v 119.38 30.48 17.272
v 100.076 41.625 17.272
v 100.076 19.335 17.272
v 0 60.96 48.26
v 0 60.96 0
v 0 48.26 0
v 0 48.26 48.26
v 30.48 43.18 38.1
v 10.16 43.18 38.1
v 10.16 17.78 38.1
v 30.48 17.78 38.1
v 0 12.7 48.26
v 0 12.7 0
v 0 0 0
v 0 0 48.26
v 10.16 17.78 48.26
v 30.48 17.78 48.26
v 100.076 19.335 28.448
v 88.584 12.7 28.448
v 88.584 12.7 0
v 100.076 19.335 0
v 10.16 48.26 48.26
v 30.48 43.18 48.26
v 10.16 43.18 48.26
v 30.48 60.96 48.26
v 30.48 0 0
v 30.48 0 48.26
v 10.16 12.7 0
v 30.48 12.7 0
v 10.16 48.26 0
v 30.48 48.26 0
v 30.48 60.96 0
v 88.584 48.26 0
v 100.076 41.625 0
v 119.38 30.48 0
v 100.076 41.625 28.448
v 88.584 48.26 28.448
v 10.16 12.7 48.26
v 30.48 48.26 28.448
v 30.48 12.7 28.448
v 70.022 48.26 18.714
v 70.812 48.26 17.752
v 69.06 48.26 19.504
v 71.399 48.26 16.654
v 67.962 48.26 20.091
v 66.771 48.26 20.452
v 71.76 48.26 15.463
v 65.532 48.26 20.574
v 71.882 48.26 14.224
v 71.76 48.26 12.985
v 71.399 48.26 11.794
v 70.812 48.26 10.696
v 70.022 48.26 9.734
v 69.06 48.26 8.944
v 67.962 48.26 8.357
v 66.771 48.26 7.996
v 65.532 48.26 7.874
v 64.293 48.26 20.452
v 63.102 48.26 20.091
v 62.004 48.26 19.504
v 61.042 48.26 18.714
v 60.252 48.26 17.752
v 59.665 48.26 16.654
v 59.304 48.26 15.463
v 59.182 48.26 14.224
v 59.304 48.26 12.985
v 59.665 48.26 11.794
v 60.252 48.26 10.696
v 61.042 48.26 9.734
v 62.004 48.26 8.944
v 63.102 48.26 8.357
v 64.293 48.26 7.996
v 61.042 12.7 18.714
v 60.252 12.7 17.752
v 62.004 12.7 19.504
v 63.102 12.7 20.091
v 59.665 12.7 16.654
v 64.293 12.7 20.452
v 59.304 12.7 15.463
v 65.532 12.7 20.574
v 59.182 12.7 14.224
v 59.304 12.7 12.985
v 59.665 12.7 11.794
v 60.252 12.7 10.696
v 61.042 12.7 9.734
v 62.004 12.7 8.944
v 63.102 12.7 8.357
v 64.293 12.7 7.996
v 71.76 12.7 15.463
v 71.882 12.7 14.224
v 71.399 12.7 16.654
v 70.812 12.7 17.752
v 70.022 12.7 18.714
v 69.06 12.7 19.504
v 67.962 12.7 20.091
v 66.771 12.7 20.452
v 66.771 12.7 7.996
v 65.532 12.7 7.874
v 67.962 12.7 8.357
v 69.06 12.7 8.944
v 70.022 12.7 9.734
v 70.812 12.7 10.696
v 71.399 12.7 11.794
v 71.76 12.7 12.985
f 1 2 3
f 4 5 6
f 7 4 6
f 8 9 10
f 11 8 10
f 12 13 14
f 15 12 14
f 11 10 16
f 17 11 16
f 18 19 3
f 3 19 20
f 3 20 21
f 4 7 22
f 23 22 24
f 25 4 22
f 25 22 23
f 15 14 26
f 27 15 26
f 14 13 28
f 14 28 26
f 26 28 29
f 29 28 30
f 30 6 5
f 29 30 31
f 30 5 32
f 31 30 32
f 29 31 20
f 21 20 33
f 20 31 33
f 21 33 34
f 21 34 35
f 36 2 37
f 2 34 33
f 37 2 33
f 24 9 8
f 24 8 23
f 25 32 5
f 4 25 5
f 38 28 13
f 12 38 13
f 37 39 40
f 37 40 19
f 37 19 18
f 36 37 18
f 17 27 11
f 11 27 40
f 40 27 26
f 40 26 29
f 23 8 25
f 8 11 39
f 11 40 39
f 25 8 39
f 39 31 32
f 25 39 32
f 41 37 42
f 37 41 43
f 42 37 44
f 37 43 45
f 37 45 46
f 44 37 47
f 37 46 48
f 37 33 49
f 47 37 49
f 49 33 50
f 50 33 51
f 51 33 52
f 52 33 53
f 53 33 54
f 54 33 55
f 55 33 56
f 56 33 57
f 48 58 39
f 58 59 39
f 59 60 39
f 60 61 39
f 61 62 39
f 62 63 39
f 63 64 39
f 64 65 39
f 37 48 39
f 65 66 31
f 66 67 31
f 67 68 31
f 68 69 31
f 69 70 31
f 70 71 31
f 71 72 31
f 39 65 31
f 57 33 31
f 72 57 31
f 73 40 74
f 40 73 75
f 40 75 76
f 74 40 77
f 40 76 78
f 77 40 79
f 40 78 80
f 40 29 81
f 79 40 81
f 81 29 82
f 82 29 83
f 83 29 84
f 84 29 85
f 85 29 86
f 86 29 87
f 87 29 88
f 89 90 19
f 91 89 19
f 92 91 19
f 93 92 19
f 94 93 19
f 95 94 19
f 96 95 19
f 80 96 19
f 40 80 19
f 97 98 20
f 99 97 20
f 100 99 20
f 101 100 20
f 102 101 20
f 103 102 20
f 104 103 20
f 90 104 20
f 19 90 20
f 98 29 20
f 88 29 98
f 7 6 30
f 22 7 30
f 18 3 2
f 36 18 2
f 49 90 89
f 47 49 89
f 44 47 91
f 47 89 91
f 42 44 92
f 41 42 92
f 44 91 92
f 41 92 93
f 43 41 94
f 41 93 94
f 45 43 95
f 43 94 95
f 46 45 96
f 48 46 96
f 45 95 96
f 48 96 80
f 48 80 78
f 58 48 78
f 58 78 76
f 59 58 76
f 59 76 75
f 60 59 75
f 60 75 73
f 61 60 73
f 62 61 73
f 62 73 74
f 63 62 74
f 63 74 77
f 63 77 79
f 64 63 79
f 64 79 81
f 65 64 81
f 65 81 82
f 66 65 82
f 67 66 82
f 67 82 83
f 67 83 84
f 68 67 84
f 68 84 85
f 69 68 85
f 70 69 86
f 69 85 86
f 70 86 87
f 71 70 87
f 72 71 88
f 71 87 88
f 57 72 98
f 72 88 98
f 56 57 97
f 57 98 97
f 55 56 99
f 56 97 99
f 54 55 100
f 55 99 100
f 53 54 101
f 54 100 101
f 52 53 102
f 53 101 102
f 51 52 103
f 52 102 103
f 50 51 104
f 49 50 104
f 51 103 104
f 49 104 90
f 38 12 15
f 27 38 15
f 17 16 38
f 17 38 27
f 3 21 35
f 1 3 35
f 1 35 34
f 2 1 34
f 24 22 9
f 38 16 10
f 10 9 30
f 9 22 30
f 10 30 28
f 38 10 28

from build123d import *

# Parameters (mm, degrees)
F1_DEPTH = 48.26
F2_DEPTH = 28.448
F3_DEPTH = 17.272
F4_W     = 25.4
F4_H     = 10.16
F5_DEPTH = 25.4
F6_R     = 6.35
F7_DEPTH = 46.482


with BuildPart() as f1:
    # F0 (on Top) → F1 (new body)
    with BuildSketch(Plane.XY):
        Polygon((0, 12.7), (0, 0), (30.48, 0), (30.48, 12.7), (30.48, 48.26), (30.48, 60.96), (0, 60.96), (0, 48.26), (10.16, 48.26), (10.16, 12.7), align=None)
    extrude(amount=F1_DEPTH)

    # F0 (on Top) → F2 (join)
    with BuildSketch(Plane.XY):
        Polygon((30.48, 48.26), (30.48, 12.7), (88.584137, 12.7), (100.076, 19.33483), (100.076, 41.62517), (88.584137, 48.26), align=None)
    extrude(amount=F2_DEPTH)

    # F0 (on Top) → F3 (join)
    with BuildSketch(Plane.XY):
        Polygon((100.076, 41.62517), (100.076, 19.33483), (119.38, 30.48), align=None)
    extrude(amount=F3_DEPTH)

    # F4 (on face) → F5 (cut)
    with BuildSketch(Plane(origin=(10.16, 0, 0), x_dir=(0, -1, 0), z_dir=(-1, 0, 0))):
        with Locations((-30.48, 43.18)):
            Rectangle(F4_W, F4_H)
    extrude(amount=-F5_DEPTH, mode=Mode.SUBTRACT)

    # F6 (on face) → F7 (cut)
    with BuildSketch(Plane.XZ.offset(-12.7)):
        with Locations((65.532, 14.224)):
            Circle(F6_R)
    extrude(amount=-F7_DEPTH, mode=Mode.SUBTRACT)


solid = f1.part
